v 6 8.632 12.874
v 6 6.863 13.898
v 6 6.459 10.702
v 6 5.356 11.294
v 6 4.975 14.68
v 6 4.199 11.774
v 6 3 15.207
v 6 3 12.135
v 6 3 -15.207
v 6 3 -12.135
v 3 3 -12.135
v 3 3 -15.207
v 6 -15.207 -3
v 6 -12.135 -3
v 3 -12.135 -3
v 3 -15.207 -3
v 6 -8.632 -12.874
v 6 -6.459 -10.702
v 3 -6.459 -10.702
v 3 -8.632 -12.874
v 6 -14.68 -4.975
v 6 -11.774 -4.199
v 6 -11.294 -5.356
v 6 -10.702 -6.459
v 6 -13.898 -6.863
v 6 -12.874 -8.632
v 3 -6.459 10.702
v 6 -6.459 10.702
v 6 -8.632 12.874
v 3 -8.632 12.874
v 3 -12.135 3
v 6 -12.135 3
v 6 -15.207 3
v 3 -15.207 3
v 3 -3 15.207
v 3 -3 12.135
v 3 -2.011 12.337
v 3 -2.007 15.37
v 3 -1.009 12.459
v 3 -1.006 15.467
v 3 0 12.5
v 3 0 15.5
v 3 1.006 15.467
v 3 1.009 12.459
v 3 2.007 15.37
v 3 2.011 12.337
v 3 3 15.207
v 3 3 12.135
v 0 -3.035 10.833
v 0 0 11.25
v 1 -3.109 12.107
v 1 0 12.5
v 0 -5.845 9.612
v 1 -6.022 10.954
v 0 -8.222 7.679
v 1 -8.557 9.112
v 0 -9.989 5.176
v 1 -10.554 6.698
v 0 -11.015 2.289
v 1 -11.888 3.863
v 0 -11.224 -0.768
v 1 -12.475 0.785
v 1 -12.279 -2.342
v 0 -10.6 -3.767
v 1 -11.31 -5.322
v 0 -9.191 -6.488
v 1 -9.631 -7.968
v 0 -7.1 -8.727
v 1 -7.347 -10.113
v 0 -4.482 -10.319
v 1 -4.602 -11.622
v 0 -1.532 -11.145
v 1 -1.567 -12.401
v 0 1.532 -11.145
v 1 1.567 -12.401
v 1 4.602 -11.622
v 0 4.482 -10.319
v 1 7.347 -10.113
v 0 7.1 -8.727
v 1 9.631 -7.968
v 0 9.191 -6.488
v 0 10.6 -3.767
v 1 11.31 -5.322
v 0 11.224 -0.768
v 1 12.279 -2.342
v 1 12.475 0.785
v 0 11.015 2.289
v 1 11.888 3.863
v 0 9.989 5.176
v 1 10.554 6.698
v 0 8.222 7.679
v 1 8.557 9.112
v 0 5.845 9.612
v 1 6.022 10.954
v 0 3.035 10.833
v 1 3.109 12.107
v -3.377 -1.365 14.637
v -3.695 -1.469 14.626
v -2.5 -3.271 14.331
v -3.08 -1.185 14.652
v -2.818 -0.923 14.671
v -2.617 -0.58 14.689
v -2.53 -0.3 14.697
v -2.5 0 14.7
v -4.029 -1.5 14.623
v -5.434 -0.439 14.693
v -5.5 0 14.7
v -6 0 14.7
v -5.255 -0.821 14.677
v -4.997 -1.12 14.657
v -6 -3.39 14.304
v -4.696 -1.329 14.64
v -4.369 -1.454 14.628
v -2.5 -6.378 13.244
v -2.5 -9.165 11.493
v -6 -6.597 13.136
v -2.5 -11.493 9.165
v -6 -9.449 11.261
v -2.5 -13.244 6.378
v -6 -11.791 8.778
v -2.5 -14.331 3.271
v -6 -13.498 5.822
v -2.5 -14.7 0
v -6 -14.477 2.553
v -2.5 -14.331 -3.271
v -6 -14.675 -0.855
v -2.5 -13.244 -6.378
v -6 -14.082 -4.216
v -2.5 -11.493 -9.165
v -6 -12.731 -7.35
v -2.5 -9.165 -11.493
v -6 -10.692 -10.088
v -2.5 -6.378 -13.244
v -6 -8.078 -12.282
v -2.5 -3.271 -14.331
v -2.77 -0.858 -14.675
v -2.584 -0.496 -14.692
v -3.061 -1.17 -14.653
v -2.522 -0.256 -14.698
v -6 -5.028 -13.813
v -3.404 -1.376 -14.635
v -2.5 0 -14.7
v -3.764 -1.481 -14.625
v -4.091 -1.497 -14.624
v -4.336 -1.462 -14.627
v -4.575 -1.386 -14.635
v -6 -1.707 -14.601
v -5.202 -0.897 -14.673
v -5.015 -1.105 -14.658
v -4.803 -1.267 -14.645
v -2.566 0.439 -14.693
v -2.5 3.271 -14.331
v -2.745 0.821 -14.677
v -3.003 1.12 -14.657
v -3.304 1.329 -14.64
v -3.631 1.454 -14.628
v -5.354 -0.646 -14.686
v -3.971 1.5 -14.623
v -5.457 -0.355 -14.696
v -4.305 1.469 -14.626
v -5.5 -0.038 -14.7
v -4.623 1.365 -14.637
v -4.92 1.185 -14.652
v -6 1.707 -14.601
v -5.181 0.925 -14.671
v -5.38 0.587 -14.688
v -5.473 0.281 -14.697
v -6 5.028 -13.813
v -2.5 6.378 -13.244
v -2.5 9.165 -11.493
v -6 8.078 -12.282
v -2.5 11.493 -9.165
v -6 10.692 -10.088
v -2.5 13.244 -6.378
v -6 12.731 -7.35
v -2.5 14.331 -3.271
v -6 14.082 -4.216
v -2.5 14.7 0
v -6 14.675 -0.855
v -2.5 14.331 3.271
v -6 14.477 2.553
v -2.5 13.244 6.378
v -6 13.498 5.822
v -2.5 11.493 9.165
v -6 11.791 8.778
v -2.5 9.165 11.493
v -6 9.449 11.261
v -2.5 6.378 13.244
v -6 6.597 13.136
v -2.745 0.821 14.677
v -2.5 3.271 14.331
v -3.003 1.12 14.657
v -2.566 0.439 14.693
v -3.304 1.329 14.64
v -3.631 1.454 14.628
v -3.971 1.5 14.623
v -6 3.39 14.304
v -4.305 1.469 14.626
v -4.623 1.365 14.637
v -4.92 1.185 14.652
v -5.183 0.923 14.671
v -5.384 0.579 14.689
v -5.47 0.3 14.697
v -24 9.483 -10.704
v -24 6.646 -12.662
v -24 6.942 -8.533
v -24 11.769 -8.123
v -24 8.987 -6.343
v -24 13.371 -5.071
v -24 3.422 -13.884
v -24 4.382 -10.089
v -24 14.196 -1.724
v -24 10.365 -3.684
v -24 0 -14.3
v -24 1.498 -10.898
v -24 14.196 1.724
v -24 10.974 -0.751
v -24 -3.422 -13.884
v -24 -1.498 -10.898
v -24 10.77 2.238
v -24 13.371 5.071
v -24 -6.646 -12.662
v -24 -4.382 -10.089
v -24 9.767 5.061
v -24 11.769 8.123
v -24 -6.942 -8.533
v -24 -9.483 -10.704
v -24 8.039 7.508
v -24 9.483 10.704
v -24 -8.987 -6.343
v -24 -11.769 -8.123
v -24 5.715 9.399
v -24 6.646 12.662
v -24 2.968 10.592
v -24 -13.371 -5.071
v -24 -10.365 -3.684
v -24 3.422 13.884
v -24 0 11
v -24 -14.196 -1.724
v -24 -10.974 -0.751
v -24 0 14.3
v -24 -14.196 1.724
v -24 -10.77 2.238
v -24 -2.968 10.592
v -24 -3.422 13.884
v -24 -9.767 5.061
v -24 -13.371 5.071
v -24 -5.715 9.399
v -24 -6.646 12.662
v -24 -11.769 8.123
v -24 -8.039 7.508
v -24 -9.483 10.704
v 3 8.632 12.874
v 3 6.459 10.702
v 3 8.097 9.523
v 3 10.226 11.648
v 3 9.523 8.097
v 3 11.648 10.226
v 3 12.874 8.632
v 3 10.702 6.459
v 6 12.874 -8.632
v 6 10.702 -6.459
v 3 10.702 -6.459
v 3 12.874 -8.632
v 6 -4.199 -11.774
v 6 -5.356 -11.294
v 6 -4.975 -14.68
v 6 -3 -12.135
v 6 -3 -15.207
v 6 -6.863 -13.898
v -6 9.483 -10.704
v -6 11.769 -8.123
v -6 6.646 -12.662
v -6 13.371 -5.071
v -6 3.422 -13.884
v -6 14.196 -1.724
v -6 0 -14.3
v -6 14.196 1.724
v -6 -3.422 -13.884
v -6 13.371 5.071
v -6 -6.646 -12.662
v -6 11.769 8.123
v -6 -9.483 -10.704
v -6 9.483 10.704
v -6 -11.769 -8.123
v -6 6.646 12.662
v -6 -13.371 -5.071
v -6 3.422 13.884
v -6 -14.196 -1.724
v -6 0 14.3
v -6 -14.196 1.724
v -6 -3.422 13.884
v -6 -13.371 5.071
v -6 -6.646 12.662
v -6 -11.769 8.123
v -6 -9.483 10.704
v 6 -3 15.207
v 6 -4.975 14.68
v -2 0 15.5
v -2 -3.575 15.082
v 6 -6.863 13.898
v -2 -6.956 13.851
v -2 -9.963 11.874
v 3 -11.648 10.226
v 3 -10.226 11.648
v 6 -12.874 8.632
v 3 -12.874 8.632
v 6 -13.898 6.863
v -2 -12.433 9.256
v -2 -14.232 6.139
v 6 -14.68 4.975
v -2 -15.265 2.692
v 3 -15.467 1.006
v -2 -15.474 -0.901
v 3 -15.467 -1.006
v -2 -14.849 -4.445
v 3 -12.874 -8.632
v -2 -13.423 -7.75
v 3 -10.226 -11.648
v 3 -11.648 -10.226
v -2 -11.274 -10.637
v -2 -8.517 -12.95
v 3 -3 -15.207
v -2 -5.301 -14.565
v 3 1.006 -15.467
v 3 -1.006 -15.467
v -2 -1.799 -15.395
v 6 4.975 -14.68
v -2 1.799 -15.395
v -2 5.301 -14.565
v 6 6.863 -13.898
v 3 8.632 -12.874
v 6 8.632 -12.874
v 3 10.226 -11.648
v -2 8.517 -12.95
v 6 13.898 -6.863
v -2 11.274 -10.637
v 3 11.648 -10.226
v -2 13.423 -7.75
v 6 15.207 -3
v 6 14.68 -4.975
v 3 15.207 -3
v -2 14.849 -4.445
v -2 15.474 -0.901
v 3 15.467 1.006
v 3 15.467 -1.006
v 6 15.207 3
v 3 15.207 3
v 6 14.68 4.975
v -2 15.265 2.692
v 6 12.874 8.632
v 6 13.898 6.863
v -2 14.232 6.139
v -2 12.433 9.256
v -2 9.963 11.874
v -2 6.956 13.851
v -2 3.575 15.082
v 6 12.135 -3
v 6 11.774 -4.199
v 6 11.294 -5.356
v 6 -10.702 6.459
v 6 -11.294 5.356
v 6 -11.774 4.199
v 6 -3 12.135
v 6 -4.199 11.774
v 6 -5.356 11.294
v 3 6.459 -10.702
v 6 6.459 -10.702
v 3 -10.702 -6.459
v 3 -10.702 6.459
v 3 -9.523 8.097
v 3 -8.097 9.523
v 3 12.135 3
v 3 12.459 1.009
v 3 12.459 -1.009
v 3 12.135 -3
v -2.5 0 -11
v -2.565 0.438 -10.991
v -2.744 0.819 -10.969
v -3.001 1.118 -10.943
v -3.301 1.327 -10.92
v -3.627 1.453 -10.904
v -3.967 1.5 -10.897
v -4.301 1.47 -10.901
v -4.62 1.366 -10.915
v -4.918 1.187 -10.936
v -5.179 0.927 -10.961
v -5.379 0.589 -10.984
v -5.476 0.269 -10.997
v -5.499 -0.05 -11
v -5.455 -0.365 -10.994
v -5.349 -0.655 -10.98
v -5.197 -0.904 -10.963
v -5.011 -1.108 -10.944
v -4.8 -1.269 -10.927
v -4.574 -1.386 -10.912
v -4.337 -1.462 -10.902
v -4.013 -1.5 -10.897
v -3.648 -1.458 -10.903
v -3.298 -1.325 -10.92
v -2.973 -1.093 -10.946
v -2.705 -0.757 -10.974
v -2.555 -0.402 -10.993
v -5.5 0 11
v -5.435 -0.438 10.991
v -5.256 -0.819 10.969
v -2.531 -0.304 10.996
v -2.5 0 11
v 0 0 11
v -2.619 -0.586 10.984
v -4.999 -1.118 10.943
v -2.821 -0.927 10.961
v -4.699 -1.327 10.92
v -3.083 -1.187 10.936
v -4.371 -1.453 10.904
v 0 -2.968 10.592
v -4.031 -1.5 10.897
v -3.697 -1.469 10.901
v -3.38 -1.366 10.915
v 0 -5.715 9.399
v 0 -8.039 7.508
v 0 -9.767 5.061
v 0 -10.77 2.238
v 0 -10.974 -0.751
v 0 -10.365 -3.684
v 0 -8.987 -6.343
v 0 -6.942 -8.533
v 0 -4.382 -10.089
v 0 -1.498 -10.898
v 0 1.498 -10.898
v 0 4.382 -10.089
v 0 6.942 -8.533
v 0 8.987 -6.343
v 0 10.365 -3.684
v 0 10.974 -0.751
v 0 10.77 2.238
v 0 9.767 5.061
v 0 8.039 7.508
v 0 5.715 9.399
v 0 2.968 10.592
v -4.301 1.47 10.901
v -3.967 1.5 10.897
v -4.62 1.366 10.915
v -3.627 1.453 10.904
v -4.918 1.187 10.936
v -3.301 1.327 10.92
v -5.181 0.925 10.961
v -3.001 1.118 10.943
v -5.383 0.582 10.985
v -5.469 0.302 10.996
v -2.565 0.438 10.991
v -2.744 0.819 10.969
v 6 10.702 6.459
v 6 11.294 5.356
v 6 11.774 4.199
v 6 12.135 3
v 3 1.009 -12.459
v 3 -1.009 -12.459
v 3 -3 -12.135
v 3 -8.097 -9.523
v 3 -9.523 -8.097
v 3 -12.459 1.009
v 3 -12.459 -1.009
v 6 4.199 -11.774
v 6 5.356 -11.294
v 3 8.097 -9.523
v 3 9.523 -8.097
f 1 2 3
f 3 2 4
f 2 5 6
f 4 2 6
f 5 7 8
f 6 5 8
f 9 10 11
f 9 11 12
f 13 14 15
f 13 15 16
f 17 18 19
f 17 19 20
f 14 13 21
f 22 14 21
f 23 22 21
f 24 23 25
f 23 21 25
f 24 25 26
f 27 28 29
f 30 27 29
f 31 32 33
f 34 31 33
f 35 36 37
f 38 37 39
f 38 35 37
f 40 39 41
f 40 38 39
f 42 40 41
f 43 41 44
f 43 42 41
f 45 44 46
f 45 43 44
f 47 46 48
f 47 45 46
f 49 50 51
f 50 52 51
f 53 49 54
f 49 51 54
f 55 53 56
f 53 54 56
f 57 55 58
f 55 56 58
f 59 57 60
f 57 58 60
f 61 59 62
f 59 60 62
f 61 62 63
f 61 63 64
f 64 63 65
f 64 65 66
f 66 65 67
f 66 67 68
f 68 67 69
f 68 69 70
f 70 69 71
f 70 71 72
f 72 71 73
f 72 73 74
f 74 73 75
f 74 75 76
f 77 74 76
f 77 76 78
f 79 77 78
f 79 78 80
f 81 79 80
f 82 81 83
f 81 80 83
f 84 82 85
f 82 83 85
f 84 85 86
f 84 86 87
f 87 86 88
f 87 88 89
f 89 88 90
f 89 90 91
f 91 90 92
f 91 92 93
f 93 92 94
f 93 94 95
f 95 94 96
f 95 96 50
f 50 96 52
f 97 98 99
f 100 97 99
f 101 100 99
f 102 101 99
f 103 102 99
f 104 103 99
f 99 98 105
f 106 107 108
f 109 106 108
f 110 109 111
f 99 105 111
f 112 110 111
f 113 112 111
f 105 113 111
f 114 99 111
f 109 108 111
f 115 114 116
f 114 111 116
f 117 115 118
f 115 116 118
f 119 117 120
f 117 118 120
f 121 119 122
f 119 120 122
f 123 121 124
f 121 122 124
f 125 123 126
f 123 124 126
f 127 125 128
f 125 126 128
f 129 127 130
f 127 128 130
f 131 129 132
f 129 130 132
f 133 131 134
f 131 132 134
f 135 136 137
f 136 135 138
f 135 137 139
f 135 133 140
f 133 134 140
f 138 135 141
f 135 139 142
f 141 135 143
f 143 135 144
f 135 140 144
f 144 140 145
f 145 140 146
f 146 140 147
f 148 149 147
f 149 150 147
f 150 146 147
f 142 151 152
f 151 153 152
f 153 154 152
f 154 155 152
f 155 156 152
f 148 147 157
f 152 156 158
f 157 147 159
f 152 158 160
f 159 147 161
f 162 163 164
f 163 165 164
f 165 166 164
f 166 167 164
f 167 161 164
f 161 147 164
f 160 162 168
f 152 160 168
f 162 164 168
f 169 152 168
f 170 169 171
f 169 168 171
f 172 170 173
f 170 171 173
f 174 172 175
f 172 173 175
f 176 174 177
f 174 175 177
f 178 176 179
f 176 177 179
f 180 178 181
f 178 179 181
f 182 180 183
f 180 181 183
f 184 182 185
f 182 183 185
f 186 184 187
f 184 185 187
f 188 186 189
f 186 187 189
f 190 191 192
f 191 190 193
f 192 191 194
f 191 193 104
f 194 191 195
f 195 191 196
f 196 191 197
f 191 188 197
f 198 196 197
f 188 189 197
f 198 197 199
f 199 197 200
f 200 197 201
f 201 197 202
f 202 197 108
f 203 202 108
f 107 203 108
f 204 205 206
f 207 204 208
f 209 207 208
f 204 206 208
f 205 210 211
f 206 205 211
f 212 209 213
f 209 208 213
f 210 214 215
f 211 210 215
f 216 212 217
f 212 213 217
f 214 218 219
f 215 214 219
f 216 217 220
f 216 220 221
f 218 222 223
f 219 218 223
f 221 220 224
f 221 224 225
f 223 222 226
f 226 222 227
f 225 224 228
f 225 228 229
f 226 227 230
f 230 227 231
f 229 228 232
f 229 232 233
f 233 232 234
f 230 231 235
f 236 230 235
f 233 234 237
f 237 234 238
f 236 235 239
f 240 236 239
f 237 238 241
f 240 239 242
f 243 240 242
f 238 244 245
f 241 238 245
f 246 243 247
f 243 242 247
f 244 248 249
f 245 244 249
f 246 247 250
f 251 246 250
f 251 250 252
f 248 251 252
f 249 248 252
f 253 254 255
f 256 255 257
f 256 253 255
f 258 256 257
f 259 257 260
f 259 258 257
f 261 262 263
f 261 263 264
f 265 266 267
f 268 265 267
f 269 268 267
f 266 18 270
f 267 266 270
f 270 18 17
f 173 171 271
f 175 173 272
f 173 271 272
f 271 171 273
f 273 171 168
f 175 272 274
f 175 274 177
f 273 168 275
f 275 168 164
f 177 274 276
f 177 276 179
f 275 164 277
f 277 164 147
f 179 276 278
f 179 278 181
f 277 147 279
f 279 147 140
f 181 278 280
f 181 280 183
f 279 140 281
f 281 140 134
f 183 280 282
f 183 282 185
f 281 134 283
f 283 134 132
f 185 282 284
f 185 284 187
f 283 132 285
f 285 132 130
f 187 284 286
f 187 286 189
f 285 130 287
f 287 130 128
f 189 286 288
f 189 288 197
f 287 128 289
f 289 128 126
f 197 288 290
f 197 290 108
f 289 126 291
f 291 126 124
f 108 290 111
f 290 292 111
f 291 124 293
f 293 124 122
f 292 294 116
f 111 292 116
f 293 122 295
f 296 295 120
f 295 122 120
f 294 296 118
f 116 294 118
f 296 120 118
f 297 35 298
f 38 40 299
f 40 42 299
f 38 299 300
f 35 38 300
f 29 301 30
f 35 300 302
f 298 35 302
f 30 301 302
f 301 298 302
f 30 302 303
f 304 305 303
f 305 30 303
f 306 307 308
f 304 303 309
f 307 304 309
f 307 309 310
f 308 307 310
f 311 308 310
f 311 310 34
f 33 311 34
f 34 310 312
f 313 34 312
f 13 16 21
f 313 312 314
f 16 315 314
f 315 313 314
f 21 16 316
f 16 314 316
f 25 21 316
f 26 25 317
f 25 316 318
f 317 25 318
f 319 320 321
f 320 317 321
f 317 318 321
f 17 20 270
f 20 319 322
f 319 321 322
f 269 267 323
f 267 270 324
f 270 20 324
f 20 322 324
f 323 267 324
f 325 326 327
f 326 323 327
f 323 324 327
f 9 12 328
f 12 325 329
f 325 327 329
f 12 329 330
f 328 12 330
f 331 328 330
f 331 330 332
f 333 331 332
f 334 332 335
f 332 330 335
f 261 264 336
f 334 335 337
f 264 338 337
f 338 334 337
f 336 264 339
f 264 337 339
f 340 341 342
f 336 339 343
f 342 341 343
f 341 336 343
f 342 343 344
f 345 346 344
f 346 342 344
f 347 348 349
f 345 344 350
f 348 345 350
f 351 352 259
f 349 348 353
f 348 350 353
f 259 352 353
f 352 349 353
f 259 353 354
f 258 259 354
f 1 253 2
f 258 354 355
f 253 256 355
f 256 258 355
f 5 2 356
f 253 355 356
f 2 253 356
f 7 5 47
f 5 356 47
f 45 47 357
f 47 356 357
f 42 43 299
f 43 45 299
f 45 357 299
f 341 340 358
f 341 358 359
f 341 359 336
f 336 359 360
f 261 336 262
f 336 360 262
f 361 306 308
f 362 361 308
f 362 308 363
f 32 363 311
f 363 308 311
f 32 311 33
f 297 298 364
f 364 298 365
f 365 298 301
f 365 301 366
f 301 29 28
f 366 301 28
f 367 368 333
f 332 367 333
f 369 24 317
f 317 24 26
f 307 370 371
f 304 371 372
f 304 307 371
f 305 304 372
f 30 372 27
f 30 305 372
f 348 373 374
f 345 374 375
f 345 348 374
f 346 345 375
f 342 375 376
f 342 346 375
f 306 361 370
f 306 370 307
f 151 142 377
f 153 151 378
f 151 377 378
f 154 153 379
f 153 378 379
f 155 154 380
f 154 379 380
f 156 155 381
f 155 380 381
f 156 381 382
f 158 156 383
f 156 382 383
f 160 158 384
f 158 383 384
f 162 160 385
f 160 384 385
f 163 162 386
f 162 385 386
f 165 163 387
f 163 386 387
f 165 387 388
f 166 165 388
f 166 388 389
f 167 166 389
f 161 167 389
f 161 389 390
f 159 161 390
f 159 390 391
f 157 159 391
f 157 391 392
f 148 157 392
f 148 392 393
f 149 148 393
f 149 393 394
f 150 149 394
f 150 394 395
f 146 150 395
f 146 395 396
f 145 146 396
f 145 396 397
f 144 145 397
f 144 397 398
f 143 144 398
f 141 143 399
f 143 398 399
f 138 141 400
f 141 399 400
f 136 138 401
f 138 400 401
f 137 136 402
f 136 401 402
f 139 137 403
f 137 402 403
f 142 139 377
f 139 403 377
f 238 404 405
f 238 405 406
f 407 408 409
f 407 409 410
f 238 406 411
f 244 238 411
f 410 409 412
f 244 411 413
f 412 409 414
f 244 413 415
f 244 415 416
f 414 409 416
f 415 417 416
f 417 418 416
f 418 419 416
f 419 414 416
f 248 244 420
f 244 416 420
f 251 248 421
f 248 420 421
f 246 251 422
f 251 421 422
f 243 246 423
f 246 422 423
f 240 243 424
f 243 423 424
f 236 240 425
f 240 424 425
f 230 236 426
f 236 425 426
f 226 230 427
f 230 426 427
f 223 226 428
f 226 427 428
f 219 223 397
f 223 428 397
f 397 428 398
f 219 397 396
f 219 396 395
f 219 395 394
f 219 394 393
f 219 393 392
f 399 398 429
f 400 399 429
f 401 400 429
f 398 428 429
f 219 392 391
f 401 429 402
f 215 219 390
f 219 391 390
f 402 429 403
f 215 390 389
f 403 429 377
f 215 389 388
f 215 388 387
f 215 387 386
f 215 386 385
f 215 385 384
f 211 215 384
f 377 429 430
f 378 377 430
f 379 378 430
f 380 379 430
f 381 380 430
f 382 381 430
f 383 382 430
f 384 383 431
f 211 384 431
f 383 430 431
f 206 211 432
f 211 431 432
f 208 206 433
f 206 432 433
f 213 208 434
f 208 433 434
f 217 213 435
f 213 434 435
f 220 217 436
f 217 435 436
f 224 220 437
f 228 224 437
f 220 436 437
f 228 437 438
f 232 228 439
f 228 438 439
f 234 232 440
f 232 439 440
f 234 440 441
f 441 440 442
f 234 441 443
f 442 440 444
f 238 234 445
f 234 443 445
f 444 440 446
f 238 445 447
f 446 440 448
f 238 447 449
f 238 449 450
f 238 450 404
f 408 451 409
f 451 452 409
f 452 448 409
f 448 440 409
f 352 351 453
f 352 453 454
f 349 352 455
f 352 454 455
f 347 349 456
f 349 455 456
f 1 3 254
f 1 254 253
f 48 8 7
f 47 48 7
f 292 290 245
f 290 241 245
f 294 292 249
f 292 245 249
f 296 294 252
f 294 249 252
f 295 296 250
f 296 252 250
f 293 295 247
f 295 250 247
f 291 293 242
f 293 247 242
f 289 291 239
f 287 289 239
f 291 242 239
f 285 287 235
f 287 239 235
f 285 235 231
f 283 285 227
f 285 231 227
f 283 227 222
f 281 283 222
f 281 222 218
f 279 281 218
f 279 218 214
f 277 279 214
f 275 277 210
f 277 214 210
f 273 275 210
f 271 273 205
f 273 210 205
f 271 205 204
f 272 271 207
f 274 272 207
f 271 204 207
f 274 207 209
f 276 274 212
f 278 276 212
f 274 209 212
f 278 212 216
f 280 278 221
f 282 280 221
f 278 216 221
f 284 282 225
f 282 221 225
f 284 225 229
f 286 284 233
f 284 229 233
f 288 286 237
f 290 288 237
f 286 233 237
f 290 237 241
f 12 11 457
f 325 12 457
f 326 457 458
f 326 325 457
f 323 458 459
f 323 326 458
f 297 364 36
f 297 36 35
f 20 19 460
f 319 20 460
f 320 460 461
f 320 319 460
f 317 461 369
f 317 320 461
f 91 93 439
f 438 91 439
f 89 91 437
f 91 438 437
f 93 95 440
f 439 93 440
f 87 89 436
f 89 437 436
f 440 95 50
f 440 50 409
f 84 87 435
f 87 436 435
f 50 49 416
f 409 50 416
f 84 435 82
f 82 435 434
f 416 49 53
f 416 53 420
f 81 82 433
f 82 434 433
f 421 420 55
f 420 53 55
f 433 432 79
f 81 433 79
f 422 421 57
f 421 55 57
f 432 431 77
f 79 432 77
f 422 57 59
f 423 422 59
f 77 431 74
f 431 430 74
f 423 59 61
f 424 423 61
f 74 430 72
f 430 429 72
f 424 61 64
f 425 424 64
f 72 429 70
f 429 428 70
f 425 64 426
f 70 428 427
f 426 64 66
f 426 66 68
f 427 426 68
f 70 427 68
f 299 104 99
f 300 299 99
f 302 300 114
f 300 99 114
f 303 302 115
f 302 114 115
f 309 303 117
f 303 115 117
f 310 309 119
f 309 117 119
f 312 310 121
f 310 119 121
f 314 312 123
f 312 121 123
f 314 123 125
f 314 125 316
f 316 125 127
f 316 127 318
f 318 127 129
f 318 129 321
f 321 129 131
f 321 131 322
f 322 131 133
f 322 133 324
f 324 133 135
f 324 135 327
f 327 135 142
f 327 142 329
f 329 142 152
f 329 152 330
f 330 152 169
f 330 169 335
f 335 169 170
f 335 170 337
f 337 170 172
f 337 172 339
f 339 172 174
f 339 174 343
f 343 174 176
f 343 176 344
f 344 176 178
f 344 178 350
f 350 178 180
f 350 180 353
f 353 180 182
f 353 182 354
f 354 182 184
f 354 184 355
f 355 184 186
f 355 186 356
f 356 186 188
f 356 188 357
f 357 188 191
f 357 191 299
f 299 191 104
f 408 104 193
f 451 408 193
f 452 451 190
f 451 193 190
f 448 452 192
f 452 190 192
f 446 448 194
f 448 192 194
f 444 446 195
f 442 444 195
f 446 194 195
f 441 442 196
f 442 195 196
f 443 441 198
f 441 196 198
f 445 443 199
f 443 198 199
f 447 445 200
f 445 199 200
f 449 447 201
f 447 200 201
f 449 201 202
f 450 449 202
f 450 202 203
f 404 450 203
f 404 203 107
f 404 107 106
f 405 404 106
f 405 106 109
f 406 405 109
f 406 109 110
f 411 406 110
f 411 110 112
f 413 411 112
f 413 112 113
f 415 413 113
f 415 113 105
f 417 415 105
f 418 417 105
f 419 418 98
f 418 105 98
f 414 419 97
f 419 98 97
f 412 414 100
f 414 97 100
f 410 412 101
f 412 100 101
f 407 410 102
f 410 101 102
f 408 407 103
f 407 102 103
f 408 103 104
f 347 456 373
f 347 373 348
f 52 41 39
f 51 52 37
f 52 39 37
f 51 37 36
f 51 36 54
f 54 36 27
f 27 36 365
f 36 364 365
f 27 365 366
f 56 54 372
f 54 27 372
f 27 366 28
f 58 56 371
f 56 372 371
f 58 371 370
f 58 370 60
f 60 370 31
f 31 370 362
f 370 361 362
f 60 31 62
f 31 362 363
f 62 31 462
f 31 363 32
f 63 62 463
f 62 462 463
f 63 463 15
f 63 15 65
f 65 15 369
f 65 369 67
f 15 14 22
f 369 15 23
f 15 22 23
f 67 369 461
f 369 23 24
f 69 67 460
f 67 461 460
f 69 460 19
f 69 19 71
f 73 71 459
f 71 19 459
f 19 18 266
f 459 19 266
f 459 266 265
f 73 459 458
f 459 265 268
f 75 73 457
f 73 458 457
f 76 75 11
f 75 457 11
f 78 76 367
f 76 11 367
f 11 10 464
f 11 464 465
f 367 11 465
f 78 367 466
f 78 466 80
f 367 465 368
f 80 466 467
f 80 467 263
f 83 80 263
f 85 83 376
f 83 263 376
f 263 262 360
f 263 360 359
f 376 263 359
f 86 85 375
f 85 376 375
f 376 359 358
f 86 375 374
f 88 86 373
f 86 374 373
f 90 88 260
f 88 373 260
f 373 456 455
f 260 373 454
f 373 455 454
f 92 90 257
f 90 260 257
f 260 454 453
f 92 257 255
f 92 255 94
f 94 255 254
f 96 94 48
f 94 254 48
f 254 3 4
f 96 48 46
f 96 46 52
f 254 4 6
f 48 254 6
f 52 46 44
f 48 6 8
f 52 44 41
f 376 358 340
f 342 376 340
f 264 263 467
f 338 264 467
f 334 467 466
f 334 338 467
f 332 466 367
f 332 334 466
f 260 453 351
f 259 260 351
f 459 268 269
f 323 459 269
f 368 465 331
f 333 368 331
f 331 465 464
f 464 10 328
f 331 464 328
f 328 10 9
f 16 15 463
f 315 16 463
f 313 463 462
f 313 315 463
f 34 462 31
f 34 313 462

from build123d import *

# Parameters (mm, degrees)
ESQUISSE2_W                  = 6
ESQUISSE2_H                  = 7
ENL_V_MAT_EXTRU_1_DEPTH      = 3
R_P_TITION_CIRCULAIRE1_COUNT = 8
ESQUISSE3_R                  = 1.5
ENL_V_MAT_EXTRU_2_DEPTH      = 50.563091106


with BuildPart() as part:
    # Esquisse1 → Base-Révolution (revolve)
    with BuildSketch(Plane.XY, mode=Mode.PRIVATE) as base_r_volution_sk:
        Polygon((-24, 11), (0, 11), (0, 11.25), (1, 12.5), (6, 12.5), (6, 15.5), (-2, 15.5), (-2.5, 14.7), (-6, 14.7), (-6, 14.3), (-24, 14.3), align=None)
    revolve(base_r_volution_sk.sketch.rotate(Axis((0, 0, 0), (1, 0, 0)), 90), axis=Axis((0, 0, 0), (1, 0, 0)))

    # Esquisse2 → Enlèv. mat.-Extru.1 (cut)
    with BuildSketch(Plane(origin=(6, 0, 0), x_dir=(0, 0, -1), z_dir=(1, 0, 0))):
        with Locations((0, 13.5)):
            Rectangle(ESQUISSE2_W, ESQUISSE2_H)
    enl_v_mat_extru_1 = extrude(amount=-ENL_V_MAT_EXTRU_1_DEPTH, mode=Mode.SUBTRACT)

    # Répétition circulaire1: Enlèv. mat.-Extru.1 ×8 about axis
    r_p_tition_circulaire1_axis = Axis((0, 0, 0), (1, 0, 0))
    for i in range(1, R_P_TITION_CIRCULAIRE1_COUNT):
        add(enl_v_mat_extru_1.rotate(r_p_tition_circulaire1_axis, i * 360 / R_P_TITION_CIRCULAIRE1_COUNT), mode=Mode.SUBTRACT)

    # Esquisse3 → Enlèv. mat.-Extru.2 (cut, through all)
    with BuildSketch(Plane.XY.offset(25)):
        with Locations((-4, 0)):
            Circle(ESQUISSE3_R)
    extrude(amount=-ENL_V_MAT_EXTRU_2_DEPTH, mode=Mode.SUBTRACT)


solid = part.part
